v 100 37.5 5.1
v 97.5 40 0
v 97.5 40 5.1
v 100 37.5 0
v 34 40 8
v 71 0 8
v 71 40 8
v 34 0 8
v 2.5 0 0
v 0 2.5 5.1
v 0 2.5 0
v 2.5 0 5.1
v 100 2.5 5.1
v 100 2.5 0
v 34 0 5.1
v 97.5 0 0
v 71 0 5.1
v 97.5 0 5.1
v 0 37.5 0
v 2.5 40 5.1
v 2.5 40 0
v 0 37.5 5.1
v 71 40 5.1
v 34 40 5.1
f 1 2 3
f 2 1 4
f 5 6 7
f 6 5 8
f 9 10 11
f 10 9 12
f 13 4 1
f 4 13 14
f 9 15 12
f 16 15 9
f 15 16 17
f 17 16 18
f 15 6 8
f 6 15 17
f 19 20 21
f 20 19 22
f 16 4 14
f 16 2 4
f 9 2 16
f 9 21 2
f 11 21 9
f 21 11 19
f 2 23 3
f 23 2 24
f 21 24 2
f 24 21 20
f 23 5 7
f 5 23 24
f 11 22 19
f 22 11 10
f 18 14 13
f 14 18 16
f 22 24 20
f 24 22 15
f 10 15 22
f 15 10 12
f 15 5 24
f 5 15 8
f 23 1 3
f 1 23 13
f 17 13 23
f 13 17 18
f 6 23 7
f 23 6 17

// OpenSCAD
$fn = 32;

// ----------------------------------------------------------------------
// Stepped bar: centerstep, 100 x 40 x 8/5.1 mm
// ----------------------------------------------------------------------

// --- parameters (mm) ---
bar_l = 100;              // bar length, X
bar_w = 40;               // bar width, Y
plate_t = 8;              // thickness of the thick zone, Z
thin_t = 5.1;             // thickness of the thin zone
corner_c = 2.5;           // corner chamfer of the bar
step_cut = 2.9;           // material removed from the thin zone
thick_from = 34;          // start of the thick middle zone
thick_to = 71;            // end of the thick middle zone
depth_1 = 2.9;            // depth of cut 1 from the top face
depth_2 = 2.9;            // depth of cut 2 from the top face

profile = [[2.5, 0], [97.5, 0], [100, 2.5], [100, 37.5], [97.5, 40], [2.5, 40], [0, 37.5], [0, 2.5]];  // primary outline, 8 points, counter clockwise
void_1 = [[-1, -1], [34, -1], [34, 41], [-1, 41]];  // thin left end, 4 points
void_2 = [[71, -1], [101, -1], [101, 41], [71, 41]];  // thin right end, 4 points

// --- the one profile operation ---
difference() {
  linear_extrude(height = plate_t) polygon(points = profile);
  translate([0, 0, plate_t - depth_1])
    linear_extrude(height = depth_1 + 1) polygon(points = void_1);
  translate([0, 0, plate_t - depth_2])
    linear_extrude(height = depth_2 + 1) polygon(points = void_2);
}
